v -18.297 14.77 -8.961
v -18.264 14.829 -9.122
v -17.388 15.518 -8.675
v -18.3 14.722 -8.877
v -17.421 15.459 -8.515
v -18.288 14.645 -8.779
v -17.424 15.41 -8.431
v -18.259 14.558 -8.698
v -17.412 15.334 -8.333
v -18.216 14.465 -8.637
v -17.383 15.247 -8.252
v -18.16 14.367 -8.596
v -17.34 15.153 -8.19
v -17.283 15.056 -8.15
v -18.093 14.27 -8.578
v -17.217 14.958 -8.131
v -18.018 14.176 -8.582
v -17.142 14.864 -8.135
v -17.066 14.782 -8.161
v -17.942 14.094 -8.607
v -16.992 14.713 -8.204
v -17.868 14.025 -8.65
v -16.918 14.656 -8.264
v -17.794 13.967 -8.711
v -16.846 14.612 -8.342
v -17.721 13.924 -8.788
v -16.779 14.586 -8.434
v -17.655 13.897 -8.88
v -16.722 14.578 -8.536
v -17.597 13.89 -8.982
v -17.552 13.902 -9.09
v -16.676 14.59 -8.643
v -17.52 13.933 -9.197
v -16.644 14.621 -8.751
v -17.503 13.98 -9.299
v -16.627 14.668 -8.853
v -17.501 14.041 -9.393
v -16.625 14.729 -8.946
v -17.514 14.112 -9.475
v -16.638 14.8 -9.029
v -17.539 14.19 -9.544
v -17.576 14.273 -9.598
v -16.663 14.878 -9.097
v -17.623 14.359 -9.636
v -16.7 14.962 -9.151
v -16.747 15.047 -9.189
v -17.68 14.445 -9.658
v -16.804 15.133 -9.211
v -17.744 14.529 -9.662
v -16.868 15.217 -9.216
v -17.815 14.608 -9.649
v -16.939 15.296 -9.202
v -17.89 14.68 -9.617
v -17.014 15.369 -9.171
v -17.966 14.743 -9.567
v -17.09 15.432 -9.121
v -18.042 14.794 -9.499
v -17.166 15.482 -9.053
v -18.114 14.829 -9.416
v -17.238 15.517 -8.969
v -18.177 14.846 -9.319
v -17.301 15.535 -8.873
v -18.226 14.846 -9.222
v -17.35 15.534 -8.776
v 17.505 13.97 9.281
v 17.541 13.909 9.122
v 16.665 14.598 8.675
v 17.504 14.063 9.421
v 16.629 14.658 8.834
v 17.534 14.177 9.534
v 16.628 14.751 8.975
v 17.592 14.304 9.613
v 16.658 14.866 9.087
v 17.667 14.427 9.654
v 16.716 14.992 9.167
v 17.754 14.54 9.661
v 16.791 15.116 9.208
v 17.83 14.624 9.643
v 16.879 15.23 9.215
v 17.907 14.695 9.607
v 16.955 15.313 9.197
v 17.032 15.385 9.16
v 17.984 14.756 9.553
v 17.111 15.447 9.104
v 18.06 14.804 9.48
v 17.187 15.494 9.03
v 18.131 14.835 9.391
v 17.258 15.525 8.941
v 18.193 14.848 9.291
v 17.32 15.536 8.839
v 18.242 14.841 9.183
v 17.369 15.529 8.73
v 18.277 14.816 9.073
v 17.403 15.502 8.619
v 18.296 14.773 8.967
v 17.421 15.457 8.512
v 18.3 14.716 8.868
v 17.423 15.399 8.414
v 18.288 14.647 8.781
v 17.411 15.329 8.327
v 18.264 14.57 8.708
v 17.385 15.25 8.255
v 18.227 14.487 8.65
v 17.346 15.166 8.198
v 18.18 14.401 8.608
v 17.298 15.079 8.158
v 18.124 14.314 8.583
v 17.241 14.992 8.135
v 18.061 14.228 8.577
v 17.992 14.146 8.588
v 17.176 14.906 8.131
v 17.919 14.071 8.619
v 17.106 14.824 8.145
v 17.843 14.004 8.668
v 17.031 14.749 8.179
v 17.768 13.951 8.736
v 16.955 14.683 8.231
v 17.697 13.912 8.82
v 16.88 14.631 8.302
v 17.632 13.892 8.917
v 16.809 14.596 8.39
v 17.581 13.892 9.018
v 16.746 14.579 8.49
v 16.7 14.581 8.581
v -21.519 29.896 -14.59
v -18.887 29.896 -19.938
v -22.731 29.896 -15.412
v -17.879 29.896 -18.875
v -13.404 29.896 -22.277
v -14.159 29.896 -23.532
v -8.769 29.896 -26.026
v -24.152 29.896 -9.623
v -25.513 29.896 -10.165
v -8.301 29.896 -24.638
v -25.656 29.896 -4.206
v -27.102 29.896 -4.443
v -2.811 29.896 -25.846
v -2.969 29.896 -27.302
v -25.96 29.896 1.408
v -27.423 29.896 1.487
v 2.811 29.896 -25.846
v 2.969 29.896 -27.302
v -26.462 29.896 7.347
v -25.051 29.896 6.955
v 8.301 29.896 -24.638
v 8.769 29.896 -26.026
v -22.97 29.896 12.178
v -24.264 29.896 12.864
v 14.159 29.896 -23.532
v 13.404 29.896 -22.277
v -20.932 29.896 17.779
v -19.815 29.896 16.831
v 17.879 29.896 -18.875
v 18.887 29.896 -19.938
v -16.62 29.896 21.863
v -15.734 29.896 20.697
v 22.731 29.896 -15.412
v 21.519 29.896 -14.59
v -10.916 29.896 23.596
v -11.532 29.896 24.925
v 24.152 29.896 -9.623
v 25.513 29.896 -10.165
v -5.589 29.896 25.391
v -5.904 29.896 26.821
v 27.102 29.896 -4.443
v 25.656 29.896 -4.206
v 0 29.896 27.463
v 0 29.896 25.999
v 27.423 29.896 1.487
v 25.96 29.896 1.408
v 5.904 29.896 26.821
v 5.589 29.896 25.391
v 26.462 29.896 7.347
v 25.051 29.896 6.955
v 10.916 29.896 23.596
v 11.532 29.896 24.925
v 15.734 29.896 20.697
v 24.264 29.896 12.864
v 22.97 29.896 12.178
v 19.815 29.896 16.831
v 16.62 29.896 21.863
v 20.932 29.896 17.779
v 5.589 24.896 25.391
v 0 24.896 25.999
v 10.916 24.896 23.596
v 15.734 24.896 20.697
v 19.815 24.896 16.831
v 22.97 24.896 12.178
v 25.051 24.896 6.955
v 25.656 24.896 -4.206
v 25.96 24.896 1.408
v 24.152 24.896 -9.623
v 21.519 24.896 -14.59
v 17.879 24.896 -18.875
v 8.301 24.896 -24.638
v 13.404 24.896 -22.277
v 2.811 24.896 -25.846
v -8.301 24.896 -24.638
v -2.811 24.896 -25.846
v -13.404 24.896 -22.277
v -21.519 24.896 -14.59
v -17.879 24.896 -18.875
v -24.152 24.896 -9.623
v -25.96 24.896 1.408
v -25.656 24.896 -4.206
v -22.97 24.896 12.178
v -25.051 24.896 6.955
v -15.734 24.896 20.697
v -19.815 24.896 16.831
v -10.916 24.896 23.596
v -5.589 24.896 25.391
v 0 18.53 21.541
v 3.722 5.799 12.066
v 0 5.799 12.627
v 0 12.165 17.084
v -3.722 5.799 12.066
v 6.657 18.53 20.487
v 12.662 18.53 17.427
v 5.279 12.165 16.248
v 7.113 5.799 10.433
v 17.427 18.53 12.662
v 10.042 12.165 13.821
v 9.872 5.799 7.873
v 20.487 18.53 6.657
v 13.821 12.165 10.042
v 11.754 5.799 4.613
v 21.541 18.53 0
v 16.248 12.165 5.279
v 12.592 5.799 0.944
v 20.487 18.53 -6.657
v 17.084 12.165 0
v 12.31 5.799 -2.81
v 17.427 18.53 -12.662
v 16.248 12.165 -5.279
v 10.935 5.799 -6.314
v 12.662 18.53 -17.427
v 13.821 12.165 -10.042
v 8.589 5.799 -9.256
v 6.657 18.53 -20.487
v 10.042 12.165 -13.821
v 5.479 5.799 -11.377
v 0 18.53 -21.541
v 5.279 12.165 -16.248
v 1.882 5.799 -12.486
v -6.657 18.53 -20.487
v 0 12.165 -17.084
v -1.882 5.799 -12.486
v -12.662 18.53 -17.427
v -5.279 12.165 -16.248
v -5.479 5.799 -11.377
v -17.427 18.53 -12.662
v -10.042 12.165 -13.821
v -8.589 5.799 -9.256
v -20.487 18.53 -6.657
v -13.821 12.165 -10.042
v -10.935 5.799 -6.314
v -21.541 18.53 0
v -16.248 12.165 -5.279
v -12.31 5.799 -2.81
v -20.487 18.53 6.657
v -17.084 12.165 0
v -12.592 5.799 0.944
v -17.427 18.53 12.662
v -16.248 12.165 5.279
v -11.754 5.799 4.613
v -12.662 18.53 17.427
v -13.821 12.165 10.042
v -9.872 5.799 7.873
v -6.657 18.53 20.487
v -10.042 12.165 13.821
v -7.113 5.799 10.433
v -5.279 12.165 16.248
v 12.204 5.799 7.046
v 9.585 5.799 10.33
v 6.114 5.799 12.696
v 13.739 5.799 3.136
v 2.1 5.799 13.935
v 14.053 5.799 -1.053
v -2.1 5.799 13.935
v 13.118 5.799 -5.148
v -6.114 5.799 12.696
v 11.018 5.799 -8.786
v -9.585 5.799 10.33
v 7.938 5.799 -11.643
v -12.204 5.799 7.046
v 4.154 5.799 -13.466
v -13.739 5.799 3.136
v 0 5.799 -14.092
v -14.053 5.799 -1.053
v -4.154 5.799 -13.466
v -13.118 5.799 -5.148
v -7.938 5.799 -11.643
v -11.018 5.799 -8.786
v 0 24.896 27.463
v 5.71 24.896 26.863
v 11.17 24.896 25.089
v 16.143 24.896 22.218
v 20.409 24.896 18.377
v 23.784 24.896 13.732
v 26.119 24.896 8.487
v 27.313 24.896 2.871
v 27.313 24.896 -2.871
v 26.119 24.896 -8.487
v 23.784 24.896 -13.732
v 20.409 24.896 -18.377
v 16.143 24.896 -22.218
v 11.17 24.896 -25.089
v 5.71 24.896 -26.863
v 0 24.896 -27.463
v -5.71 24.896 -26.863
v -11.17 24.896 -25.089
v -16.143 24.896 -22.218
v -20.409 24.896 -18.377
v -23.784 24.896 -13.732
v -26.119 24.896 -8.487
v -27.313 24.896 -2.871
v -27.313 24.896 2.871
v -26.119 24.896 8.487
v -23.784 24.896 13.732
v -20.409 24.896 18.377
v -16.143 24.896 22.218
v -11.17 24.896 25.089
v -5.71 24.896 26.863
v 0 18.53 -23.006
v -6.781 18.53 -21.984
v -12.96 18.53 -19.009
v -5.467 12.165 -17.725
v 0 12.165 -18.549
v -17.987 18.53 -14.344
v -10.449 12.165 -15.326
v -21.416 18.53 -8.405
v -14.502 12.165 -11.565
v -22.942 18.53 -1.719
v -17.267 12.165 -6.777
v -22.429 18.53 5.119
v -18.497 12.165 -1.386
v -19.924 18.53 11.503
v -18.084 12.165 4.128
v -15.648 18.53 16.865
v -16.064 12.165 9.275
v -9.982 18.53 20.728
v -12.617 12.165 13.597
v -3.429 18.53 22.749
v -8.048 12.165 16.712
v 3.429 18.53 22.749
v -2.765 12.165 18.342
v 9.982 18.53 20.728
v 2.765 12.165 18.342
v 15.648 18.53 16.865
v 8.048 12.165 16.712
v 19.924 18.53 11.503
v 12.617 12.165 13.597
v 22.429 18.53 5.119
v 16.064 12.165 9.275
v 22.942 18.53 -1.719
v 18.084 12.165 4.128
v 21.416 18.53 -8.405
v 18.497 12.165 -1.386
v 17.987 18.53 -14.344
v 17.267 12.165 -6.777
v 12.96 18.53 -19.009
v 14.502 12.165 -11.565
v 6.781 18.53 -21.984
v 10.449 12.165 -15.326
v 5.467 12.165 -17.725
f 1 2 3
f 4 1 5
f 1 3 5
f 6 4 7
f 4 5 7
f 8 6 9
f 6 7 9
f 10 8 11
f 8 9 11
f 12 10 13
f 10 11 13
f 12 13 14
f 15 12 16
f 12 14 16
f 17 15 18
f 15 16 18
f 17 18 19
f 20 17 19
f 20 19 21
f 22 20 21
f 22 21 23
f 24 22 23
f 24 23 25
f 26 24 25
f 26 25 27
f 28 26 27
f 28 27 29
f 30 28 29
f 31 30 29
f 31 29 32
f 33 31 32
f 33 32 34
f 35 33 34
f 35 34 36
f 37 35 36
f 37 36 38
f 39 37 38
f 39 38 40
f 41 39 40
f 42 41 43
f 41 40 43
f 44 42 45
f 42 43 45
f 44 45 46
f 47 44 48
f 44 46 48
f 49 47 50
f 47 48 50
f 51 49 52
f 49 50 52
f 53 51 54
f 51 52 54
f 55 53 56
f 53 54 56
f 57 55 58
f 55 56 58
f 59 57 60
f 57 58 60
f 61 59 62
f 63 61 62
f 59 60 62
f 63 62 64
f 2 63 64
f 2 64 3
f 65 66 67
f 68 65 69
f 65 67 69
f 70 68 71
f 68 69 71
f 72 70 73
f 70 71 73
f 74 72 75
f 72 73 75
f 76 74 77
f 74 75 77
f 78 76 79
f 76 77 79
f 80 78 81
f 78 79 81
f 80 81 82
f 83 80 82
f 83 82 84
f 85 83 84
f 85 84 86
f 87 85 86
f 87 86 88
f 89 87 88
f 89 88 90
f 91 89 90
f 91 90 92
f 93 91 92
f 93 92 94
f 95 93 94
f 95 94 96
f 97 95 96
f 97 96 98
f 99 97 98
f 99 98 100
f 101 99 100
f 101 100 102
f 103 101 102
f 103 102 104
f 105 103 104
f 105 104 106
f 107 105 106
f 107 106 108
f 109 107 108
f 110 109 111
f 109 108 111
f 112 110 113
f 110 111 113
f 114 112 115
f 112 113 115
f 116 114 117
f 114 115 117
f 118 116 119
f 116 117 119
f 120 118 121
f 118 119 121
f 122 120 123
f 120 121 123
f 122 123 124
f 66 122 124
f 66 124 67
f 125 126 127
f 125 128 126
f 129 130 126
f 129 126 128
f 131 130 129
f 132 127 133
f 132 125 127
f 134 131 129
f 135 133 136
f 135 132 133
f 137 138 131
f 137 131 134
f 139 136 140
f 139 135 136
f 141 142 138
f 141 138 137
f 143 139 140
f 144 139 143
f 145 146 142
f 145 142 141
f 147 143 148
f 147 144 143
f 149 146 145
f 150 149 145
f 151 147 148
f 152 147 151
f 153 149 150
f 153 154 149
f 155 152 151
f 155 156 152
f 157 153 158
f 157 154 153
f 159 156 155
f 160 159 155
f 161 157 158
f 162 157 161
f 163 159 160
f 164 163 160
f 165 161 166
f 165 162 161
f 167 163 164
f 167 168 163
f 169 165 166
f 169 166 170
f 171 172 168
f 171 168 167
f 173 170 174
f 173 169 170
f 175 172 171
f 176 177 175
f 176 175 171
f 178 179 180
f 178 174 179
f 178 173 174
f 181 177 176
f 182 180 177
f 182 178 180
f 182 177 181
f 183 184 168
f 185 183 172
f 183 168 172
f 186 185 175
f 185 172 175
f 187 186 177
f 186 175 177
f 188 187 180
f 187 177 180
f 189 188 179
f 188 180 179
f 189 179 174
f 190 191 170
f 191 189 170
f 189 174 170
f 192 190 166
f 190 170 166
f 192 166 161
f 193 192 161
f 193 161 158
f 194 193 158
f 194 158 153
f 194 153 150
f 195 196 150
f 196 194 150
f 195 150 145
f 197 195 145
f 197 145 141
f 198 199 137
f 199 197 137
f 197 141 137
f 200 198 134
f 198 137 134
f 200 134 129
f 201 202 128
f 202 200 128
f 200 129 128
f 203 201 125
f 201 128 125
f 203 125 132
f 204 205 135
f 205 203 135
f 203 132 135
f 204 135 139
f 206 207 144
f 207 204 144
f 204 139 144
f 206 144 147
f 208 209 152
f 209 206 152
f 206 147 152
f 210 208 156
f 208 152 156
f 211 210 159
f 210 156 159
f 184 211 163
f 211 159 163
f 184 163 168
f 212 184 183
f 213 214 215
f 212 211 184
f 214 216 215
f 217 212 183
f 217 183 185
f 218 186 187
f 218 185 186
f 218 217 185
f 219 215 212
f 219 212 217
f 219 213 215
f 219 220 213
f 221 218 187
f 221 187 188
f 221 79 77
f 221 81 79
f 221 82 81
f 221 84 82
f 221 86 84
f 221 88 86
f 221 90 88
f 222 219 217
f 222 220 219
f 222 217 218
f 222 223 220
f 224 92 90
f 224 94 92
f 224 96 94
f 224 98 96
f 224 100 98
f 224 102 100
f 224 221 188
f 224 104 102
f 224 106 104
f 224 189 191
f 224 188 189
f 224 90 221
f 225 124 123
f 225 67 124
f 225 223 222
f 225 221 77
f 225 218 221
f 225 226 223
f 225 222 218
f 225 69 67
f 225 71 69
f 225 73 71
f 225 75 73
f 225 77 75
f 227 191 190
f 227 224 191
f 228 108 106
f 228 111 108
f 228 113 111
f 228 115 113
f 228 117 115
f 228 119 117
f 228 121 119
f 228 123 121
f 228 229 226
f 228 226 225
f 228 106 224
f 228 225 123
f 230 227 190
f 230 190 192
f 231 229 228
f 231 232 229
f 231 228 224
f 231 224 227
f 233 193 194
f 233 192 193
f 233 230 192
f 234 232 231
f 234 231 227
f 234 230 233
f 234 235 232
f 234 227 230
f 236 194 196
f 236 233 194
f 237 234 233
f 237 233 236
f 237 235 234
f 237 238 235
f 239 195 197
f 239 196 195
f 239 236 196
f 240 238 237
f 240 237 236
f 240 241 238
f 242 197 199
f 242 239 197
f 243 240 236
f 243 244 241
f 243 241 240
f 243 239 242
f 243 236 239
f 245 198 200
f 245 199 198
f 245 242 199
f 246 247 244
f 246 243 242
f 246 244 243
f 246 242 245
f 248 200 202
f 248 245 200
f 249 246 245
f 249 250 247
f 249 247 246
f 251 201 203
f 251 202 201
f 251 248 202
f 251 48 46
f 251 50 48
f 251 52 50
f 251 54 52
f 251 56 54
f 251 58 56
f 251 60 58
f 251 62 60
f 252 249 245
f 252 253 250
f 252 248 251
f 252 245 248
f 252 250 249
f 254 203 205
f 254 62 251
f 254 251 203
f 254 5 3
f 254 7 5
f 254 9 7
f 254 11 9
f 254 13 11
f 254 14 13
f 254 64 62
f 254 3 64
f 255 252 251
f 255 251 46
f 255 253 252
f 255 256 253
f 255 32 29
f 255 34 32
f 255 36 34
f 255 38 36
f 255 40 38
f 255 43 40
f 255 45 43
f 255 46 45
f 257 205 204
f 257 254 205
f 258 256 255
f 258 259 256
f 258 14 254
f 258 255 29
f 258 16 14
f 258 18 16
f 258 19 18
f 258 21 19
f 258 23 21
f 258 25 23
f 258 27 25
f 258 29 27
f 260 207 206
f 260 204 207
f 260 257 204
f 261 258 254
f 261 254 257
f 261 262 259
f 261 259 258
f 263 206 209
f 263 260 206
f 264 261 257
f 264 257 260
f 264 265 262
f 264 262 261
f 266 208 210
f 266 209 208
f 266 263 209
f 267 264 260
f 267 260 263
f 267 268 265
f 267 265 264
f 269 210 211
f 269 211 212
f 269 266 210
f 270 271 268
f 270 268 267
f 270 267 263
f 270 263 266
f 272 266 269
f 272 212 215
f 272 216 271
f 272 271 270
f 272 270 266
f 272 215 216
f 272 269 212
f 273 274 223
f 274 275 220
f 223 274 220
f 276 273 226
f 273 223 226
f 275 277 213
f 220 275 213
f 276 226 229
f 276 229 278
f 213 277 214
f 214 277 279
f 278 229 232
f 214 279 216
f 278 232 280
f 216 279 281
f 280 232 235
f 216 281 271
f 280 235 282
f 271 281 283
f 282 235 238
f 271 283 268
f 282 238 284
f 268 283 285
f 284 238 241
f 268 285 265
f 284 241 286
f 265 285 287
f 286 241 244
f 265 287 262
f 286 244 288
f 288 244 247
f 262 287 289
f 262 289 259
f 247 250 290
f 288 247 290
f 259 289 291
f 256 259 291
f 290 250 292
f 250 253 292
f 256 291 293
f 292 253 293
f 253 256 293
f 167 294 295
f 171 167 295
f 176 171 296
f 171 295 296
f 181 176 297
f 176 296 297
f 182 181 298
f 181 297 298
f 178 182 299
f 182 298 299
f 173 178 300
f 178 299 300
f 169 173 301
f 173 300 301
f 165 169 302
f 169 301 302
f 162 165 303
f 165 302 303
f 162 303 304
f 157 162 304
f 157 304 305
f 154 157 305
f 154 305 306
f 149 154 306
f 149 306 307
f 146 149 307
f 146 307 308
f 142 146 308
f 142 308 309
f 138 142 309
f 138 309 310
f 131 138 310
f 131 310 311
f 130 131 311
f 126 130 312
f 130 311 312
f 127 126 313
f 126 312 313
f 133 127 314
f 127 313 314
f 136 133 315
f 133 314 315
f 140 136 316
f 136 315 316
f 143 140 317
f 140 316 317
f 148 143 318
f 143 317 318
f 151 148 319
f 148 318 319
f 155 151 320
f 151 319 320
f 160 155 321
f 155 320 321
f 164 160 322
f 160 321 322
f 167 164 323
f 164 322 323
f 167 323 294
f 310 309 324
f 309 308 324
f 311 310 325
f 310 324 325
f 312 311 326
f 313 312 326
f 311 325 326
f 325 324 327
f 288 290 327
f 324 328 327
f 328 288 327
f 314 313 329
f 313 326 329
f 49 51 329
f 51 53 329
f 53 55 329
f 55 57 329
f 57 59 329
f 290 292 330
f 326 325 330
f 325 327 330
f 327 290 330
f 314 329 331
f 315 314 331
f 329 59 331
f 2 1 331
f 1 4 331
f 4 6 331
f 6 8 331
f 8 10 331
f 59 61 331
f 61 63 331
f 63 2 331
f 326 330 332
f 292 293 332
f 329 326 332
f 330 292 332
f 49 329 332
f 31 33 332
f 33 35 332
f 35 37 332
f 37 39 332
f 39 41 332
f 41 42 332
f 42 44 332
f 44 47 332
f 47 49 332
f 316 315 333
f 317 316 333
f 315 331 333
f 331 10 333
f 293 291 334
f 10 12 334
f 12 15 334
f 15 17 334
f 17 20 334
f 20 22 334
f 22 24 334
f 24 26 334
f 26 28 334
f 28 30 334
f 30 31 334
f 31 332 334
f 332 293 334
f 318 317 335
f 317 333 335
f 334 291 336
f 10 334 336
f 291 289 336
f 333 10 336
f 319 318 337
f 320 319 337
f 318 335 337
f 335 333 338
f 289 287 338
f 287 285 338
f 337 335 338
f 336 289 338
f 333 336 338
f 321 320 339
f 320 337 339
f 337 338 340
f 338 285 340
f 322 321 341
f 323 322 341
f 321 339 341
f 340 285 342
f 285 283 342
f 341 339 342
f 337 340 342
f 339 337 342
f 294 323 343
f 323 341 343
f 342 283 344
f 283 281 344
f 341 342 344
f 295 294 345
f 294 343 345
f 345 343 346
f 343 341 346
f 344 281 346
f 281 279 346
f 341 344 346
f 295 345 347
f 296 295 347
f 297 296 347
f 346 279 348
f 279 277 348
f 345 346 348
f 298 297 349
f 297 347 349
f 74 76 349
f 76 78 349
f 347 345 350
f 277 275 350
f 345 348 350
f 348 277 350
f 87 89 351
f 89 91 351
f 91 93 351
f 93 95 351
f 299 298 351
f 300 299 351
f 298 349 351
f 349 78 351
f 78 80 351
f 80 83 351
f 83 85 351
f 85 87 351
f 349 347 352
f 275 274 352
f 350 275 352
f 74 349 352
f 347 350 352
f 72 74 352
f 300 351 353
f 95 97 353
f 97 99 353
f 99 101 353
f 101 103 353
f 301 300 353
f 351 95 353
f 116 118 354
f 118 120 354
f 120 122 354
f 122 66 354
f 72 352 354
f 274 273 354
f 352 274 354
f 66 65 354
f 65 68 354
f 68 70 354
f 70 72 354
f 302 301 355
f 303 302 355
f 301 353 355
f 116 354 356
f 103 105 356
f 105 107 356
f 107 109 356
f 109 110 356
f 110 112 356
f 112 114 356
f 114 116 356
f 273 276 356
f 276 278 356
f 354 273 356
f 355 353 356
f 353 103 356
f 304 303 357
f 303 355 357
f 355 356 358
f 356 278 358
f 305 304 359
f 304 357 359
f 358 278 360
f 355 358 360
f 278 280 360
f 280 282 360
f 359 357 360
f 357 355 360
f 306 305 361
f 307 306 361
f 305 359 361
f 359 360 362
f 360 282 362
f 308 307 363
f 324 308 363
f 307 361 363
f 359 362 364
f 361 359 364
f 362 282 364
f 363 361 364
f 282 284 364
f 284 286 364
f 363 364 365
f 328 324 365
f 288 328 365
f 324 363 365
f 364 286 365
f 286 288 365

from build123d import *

# Parameters (mm, degrees)
SKETCH26_R                       = 27.463437659
BOSS_EXTRUDE1_DEPTH              = 5
SKETCH27_R                       = 25.998508152
CUT_EXTRUDE1_DEPTH               = 5
F_0_55_0_55_DIAMETER_HOLE2_D     = 1.17
F_0_55_0_55_DIAMETER_HOLE2_DEPTH = 2
F_0_55_0_55_DIAMETER_HOLE2_TIP   = 0.351503462
F_0_55_0_55_DIAMETER_HOLE4_D     = 1.17
F_0_55_0_55_DIAMETER_HOLE4_DEPTH = 2
F_0_55_0_55_DIAMETER_HOLE4_TIP   = 0.351503462


with BuildPart() as part:
    # Sketch23 → Revolve3 (revolve)
    with BuildSketch(Plane(origin=(0, 0, 0), x_dir=(-1, 0, 0), z_dir=(0, 0, -1)), mode=Mode.PRIVATE) as revolve3_sk:
        Polygon((0, 24.895699348), (-27.463437659, 24.895699348), (-14.091987401, 5.799289315), (0, 5.799289315), align=None)
    revolve(revolve3_sk.sketch.rotate(Axis((0, 0, 0), (0, 1, 0)), 90), axis=Axis((0, 0, 0), (0, 1, 0)))

    # Sketch25 → Cut-Revolve3 (revolve, cut)
    with BuildSketch(Plane(origin=(0, 0, 0), x_dir=(-1, 0, 0), z_dir=(0, 0, -1)), mode=Mode.PRIVATE) as cut_revolve3_sk:
        Polygon((0, 30), (-29.6127402, 30.057357644), (-10.448606131, 2.688137772), (0, 2.666892546), align=None)
    revolve(cut_revolve3_sk.sketch.rotate(Axis((0, 0, 0), (0, 1, 0)), 270), axis=Axis((0, 0, 0), (0, 1, 0)), mode=Mode.SUBTRACT)

    # Sketch26 → Boss-Extrude1 (add)
    with BuildSketch(Plane(origin=(0, 24.895699348, 0), x_dir=(1, 0, 0), z_dir=(0, 1, 0))):
        with Locations(Location((0, 0, 0), (0, 0, 270))):
            Circle(SKETCH26_R)
    extrude(amount=BOSS_EXTRUDE1_DEPTH)

    # Sketch27 → Cut-Extrude1 (cut)
    with BuildSketch(Plane(origin=(0, 29.895699348, 0), x_dir=(1, 0, 0), z_dir=(0, 1, 0))):
        with Locations(Location((0, 0, 0), (0, 0, 270))):
            Circle(SKETCH27_R)
    extrude(amount=-CUT_EXTRUDE1_DEPTH, mode=Mode.SUBTRACT)

    # Ø0.55 (0.55) Diameter Hole2
    with Locations(Plane(origin=(17.902646224, 14.36906592, 9.121853864), x_dir=(0.617893015445, 0.786262183666, 0), z_dir=(0.729869815764, -0.573576436351, 0.371887245949))):
        with Locations((0, 0)):
            Hole(F_0_55_0_55_DIAMETER_HOLE2_D / 2, depth=F_0_55_0_55_DIAMETER_HOLE2_DEPTH)
            with Locations((0, 0, -(F_0_55_0_55_DIAMETER_HOLE2_DEPTH + F_0_55_0_55_DIAMETER_HOLE2_TIP / 2))):  # 118° drill point
                Cone(0, F_0_55_0_55_DIAMETER_HOLE2_D / 2, F_0_55_0_55_DIAMETER_HOLE2_TIP, mode=Mode.SUBTRACT)

    # Ø0.55 (0.55) Diameter Hole4
    with Locations(Plane(origin=(-17.902646224, 14.36906592, -9.121853864), x_dir=(0.617893015445, -0.786262183666, 0), z_dir=(-0.729869815764, -0.573576436351, -0.371887245949))):
        with Locations((0, 0)):
            Hole(F_0_55_0_55_DIAMETER_HOLE4_D / 2, depth=F_0_55_0_55_DIAMETER_HOLE4_DEPTH)
            with Locations((0, 0, -(F_0_55_0_55_DIAMETER_HOLE4_DEPTH + F_0_55_0_55_DIAMETER_HOLE4_TIP / 2))):  # 118° drill point
                Cone(0, F_0_55_0_55_DIAMETER_HOLE4_D / 2, F_0_55_0_55_DIAMETER_HOLE4_TIP, mode=Mode.SUBTRACT)


solid = part.part
